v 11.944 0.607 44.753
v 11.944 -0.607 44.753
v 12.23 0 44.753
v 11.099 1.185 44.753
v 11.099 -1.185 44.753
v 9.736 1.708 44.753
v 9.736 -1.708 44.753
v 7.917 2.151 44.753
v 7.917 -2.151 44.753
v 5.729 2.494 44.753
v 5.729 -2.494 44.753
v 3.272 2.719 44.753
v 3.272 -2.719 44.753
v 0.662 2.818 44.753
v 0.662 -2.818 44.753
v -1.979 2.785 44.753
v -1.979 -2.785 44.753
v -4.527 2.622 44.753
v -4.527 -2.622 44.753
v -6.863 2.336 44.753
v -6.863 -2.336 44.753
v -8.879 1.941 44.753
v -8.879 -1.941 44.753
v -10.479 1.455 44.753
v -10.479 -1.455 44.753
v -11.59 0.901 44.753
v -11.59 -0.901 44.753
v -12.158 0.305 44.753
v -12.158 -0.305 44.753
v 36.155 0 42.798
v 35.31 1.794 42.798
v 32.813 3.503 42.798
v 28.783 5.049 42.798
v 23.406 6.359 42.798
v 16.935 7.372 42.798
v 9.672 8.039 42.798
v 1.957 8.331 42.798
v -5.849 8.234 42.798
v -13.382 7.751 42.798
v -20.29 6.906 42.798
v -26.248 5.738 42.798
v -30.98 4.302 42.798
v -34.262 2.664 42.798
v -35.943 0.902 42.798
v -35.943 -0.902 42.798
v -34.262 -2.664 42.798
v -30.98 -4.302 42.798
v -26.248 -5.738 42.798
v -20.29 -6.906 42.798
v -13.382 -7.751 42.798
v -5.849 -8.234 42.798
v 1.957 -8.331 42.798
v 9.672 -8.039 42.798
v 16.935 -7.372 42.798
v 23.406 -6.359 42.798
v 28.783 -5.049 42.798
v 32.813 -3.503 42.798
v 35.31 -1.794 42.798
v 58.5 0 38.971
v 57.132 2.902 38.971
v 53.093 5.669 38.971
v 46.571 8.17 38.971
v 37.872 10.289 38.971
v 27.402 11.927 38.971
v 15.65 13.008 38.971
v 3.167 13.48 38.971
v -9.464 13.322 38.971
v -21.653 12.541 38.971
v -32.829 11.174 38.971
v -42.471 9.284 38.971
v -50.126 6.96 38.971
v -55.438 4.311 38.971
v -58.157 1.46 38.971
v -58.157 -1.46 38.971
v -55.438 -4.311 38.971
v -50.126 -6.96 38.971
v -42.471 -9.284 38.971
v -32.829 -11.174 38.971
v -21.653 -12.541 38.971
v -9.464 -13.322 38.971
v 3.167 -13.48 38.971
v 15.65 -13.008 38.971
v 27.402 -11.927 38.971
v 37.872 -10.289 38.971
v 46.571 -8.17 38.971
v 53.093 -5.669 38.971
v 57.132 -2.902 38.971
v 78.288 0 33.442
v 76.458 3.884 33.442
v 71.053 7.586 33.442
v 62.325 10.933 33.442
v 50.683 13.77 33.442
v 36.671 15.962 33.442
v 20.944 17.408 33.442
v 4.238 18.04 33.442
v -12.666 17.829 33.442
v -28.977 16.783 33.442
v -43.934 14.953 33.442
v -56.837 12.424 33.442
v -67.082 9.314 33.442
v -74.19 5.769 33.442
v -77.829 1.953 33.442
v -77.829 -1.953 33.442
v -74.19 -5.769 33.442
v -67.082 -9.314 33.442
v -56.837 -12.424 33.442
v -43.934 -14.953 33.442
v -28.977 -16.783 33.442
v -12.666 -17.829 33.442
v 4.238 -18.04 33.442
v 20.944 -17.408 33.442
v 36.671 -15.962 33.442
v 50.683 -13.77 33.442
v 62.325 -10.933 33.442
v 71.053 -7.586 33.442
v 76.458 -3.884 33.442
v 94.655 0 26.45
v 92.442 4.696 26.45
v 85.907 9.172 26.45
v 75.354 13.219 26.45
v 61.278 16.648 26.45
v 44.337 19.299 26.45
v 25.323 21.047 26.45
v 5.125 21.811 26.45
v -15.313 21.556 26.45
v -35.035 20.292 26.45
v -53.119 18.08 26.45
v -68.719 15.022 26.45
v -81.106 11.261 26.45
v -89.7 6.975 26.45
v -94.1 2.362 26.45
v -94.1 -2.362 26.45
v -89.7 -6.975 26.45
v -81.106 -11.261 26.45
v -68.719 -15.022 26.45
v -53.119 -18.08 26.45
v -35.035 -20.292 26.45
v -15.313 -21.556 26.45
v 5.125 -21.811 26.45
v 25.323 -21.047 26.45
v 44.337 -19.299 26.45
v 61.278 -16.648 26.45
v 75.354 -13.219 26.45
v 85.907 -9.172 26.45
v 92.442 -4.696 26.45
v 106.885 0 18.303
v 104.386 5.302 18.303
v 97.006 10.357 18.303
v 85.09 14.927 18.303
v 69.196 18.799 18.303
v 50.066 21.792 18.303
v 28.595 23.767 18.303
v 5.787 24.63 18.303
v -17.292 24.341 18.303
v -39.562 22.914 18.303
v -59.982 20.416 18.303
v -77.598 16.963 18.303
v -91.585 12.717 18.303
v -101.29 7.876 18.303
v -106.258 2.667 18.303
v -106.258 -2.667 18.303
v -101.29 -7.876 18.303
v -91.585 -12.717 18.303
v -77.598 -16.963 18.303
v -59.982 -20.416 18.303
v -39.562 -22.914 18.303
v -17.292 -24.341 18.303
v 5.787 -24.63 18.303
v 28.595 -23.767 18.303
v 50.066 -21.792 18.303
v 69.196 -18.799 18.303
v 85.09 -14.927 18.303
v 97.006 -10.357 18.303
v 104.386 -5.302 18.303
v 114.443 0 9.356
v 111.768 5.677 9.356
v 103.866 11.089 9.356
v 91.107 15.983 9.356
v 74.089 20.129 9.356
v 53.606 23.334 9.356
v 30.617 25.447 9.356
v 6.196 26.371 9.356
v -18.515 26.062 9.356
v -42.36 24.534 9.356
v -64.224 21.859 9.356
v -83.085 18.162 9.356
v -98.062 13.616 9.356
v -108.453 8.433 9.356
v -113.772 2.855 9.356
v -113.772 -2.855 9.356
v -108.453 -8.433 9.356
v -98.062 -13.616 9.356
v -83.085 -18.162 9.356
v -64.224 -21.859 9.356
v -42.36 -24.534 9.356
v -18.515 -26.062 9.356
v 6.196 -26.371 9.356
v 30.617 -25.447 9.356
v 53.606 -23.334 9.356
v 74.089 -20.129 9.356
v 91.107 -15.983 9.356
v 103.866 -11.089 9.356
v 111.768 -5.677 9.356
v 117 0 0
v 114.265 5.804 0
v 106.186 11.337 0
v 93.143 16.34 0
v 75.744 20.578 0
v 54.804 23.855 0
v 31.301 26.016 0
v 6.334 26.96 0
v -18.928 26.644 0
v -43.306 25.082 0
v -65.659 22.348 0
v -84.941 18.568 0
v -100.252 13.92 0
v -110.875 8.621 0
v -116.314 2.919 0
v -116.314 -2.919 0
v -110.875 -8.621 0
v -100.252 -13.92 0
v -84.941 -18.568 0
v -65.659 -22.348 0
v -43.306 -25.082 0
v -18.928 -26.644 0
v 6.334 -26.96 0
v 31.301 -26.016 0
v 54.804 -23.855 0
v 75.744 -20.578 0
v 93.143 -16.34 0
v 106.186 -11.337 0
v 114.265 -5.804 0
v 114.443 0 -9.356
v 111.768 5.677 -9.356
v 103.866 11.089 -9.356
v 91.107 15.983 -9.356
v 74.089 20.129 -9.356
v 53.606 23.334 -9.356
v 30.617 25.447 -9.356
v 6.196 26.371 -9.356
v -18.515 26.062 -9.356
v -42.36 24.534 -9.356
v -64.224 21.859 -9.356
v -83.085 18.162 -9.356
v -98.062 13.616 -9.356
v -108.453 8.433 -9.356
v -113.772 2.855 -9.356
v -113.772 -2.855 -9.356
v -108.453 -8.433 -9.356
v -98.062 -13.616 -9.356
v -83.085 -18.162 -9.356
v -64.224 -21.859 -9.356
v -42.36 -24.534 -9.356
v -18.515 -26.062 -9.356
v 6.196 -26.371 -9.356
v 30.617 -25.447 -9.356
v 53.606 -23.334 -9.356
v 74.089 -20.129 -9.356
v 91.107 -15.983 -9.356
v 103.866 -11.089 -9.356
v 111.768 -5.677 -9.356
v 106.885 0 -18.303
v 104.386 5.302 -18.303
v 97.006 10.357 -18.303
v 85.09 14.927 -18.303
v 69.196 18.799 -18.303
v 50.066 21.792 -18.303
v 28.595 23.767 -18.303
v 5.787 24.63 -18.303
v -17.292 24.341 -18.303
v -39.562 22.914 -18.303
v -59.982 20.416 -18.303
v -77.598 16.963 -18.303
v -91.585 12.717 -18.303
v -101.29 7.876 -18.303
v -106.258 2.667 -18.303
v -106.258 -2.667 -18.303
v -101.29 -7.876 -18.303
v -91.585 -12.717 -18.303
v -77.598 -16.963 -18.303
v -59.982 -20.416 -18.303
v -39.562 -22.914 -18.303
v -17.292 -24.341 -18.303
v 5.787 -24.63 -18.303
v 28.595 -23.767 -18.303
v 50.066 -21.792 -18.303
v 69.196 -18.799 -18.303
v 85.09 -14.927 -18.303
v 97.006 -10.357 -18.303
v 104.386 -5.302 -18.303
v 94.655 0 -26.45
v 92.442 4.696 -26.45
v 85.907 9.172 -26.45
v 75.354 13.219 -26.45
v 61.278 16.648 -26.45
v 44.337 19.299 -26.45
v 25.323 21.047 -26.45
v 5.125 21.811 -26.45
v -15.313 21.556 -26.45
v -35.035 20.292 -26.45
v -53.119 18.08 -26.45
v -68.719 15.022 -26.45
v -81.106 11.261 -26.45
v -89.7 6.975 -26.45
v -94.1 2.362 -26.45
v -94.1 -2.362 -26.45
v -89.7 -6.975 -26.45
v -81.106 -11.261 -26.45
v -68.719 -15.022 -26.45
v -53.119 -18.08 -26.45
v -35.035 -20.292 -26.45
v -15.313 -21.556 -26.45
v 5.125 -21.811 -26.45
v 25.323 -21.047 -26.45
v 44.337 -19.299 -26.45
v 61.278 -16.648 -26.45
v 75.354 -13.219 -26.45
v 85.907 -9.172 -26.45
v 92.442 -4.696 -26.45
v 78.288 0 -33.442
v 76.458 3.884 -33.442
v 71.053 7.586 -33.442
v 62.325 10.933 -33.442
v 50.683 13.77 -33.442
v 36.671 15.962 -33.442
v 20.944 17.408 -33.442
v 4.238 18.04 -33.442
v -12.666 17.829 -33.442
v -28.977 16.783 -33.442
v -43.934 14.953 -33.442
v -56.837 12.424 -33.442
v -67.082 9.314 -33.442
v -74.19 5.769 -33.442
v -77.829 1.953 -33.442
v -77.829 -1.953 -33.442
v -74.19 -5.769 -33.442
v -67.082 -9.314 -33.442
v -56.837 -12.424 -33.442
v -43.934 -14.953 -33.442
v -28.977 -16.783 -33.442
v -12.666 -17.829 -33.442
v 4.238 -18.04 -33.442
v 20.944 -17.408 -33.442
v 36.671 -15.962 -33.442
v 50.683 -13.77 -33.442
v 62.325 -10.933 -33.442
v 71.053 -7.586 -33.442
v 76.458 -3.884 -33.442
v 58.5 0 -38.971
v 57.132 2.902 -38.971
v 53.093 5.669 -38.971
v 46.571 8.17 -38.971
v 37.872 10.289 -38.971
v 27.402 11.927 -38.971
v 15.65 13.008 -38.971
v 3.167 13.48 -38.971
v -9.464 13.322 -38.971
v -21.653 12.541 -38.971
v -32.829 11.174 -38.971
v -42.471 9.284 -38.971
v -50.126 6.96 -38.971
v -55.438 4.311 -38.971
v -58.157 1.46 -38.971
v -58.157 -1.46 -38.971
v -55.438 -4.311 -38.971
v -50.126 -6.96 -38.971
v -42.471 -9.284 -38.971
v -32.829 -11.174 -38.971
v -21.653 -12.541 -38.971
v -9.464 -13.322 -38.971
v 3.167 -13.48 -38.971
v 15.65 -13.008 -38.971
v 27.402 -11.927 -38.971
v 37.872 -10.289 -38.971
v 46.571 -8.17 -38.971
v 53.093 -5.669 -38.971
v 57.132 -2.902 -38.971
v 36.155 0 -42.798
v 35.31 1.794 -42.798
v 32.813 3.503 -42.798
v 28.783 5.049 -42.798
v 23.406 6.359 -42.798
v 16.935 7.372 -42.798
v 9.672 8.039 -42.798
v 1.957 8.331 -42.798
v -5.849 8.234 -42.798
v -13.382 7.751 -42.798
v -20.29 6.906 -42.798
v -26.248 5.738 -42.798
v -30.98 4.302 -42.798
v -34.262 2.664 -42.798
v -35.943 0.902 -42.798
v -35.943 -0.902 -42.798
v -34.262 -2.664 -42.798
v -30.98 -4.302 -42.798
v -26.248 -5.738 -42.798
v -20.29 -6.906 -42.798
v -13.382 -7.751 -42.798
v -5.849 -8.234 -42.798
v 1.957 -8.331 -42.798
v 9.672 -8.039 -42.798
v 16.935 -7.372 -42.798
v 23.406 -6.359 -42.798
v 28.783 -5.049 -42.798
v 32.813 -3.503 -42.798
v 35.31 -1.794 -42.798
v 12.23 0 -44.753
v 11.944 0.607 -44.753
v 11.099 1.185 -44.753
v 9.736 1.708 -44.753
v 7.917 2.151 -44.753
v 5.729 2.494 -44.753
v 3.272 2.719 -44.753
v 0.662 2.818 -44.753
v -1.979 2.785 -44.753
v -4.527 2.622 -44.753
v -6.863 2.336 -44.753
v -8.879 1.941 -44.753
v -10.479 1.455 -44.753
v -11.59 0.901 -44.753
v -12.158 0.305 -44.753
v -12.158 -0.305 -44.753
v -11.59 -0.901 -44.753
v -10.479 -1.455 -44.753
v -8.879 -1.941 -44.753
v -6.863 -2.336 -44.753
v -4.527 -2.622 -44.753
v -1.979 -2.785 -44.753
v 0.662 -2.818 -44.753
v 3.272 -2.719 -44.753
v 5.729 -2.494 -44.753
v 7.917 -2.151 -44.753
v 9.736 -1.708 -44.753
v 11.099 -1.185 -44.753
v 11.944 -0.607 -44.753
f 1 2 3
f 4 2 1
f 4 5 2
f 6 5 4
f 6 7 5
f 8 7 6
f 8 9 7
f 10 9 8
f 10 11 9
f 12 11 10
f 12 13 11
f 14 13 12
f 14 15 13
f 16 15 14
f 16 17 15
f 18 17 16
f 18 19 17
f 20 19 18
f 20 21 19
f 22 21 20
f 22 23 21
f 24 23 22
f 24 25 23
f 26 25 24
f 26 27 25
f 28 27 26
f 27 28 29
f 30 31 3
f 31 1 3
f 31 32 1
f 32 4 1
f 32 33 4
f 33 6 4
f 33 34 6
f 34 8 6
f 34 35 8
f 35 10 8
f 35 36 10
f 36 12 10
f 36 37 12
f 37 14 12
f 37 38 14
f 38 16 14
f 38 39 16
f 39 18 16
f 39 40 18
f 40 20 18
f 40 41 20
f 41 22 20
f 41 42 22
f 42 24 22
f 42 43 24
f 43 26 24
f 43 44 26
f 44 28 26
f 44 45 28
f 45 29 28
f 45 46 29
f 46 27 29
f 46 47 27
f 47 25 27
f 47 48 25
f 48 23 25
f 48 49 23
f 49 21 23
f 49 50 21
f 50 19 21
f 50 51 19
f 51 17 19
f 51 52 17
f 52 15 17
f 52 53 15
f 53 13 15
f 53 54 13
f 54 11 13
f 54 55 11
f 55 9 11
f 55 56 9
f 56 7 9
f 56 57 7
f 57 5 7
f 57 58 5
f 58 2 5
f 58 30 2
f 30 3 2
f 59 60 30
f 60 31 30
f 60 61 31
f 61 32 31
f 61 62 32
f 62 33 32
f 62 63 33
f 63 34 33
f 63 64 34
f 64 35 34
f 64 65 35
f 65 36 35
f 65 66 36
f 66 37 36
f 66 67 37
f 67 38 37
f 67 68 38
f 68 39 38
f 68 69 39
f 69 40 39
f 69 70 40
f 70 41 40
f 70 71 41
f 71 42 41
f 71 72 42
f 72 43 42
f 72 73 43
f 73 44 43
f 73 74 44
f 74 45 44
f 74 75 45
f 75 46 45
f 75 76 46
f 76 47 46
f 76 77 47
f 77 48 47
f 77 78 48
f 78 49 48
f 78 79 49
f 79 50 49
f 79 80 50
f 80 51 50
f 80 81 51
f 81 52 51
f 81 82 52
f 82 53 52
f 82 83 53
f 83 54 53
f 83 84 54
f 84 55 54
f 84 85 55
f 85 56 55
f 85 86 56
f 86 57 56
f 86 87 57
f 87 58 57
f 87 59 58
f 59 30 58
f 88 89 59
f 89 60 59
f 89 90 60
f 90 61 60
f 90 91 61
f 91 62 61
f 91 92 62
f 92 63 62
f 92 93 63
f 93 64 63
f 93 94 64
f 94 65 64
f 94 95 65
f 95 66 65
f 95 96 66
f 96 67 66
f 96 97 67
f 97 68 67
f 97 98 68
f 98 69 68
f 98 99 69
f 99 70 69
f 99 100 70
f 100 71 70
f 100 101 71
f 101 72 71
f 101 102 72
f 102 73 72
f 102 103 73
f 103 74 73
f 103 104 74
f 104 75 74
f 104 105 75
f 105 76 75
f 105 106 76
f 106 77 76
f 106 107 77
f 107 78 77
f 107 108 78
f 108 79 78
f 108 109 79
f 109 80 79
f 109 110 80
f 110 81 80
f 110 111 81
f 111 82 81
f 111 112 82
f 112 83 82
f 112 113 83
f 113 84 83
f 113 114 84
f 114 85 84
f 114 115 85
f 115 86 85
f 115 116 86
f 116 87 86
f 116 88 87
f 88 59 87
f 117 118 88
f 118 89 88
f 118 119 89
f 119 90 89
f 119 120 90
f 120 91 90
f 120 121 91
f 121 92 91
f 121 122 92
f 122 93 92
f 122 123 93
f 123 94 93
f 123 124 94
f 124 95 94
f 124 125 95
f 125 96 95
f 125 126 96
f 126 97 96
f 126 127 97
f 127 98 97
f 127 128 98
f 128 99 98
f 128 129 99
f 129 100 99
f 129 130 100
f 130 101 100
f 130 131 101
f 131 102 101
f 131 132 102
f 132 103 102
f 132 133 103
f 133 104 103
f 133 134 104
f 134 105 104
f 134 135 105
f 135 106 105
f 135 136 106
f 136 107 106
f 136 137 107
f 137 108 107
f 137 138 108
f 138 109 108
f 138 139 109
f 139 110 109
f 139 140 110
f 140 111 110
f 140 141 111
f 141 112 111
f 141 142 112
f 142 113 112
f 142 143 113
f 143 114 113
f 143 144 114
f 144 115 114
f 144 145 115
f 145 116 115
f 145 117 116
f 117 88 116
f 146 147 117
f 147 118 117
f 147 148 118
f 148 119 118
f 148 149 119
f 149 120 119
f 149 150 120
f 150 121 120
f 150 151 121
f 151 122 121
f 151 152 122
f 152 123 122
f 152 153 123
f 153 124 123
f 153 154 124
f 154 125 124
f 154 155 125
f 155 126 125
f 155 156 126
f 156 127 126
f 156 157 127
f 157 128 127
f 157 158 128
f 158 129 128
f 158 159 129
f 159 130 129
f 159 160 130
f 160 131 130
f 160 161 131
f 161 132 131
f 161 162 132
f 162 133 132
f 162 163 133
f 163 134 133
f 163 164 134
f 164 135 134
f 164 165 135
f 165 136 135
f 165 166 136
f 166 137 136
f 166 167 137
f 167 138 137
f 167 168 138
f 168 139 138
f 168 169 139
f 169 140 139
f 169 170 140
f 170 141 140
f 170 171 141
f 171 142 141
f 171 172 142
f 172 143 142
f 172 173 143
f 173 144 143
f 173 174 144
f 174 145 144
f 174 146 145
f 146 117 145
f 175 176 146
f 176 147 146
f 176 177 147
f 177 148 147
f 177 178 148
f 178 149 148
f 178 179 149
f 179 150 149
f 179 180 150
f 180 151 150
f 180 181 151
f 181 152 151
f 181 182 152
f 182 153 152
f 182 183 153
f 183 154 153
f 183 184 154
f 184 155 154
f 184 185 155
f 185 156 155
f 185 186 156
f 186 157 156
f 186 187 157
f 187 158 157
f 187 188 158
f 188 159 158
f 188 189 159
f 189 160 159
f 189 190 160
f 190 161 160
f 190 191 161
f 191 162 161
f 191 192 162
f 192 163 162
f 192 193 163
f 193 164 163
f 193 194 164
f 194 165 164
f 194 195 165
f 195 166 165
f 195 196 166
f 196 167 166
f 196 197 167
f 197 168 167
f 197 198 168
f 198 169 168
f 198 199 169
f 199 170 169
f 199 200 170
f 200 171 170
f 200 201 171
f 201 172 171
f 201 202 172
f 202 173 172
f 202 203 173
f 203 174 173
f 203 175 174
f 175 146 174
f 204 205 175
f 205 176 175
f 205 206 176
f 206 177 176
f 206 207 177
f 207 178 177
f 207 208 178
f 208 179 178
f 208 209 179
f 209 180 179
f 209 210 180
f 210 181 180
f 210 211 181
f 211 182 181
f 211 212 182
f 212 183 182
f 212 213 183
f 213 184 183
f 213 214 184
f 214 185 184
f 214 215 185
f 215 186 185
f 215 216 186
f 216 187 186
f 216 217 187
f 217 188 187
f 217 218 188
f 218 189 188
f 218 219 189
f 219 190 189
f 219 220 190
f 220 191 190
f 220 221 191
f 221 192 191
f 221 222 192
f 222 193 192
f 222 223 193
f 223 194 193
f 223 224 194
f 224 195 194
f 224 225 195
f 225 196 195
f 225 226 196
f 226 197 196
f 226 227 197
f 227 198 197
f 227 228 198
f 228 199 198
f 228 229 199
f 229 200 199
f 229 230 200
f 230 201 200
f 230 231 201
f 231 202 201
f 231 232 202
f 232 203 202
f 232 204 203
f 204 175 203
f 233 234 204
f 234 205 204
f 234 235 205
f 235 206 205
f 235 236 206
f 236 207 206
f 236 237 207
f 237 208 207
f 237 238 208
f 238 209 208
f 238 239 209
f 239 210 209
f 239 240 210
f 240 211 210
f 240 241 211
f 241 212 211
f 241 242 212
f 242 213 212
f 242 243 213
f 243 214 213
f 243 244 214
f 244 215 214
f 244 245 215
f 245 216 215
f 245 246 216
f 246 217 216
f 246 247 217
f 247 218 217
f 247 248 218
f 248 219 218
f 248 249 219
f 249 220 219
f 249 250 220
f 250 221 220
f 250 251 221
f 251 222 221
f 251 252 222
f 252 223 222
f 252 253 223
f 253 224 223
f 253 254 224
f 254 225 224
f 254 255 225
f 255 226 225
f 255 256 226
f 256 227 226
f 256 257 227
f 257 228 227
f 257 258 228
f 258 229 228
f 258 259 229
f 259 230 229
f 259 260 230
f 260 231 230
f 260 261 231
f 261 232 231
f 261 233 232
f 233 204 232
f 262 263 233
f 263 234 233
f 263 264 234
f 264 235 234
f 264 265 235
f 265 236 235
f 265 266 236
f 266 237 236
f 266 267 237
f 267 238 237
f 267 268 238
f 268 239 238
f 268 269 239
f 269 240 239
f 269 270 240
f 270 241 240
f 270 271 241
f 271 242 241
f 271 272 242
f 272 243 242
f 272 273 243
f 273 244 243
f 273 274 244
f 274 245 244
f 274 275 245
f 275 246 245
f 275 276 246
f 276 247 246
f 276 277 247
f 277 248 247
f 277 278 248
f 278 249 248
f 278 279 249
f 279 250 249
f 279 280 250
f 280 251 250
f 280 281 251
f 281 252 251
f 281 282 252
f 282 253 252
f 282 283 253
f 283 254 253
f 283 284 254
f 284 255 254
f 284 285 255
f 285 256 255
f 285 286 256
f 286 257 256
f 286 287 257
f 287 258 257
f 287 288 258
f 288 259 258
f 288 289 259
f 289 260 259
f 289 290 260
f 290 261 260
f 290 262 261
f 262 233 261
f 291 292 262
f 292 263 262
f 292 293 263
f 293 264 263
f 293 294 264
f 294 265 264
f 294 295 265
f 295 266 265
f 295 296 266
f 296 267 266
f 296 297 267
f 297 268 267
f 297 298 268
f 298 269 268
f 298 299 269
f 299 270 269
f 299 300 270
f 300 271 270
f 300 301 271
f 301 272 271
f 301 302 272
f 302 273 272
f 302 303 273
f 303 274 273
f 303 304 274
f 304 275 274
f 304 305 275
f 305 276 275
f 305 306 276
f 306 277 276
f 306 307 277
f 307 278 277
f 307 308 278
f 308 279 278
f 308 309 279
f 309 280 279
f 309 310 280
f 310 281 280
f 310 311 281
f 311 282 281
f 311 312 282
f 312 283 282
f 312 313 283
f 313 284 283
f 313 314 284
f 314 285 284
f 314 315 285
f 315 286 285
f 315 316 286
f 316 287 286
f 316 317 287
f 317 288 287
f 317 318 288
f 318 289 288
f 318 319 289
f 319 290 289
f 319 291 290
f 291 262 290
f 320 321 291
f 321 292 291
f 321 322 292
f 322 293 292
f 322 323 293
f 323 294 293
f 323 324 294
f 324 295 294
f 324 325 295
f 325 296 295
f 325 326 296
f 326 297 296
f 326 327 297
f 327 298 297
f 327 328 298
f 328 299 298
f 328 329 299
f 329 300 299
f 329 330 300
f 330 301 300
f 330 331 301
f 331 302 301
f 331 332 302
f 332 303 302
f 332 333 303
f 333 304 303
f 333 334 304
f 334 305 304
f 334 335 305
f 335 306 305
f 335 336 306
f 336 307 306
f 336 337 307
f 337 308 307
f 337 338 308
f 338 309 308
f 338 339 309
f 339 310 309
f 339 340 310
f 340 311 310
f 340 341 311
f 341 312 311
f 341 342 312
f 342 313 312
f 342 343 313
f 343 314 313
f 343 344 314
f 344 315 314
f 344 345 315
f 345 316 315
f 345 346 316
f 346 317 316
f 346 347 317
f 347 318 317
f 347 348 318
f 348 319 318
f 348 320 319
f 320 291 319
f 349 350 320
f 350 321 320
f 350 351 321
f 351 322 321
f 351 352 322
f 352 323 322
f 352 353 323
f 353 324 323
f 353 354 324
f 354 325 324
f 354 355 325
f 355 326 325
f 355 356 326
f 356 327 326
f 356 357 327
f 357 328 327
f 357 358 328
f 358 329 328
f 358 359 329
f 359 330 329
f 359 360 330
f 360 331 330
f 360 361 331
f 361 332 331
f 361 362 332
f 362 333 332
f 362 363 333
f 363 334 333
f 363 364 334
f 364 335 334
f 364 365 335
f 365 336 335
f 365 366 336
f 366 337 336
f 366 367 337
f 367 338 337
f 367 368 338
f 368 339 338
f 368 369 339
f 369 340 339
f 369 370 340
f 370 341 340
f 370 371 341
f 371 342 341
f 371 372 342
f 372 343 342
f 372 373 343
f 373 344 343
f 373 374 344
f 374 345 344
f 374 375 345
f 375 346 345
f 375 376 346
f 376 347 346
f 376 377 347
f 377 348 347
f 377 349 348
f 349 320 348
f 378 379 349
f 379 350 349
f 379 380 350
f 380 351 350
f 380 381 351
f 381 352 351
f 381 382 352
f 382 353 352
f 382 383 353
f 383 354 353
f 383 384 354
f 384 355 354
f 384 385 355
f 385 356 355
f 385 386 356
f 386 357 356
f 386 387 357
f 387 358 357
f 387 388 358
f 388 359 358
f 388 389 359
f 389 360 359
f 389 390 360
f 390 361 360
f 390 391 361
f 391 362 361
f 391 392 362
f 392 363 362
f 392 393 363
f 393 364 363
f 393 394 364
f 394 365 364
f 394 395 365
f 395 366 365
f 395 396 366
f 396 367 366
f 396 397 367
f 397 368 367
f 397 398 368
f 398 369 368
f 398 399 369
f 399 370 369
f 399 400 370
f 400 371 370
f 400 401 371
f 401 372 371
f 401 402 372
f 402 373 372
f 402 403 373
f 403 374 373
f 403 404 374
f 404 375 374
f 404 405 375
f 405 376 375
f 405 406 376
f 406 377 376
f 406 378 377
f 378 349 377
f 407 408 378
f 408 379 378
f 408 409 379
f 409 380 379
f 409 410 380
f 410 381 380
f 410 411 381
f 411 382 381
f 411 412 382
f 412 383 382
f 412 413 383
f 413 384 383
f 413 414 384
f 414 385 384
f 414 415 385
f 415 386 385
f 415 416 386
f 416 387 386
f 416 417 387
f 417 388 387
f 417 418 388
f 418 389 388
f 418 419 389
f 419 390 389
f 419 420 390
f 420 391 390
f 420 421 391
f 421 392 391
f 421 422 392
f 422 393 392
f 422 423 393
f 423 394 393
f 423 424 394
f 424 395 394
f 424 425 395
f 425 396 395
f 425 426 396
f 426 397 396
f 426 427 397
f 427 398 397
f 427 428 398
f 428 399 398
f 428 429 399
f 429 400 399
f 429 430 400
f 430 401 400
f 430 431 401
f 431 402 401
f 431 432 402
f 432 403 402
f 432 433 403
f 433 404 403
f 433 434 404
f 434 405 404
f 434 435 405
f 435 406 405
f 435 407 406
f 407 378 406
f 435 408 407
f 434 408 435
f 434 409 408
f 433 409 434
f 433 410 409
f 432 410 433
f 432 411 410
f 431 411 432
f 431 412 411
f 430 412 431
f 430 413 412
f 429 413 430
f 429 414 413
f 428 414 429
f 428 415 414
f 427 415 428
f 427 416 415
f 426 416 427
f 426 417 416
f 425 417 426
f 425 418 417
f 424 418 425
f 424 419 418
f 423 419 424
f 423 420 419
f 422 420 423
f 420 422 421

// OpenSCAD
// Generated by SolidPython 1.0.1 on 2020-07-29 00:46:50


scale(v = [13, 3, 5]) {
	sphere(r = 9);
}
/***********************************************
*********      SolidPython code:      **********
************************************************
 
# import packages: SolidPython
from solid import *
from solid.utils import *
from itertools import chain, combinations, permutations


class Resize:

    def __init__(self, scad_file):
        self.scad_file = scad_file
        #self.scad_file = import_scad(scad_file)
        # cone/cylinder param:
        self.r1 = 0
        self.r2 = 0
        self.h = 0
        # rectangular prism param:
        self.w = 0
        self.l = 0
        # ellipse param:
        self.r = 0

    # import OpenScad code (file name corresponds to shape)


    # classify shape + parameters
    def assign(self, param1, param2, param3):
        if self.scad_file == 'cone.scad':
            self.r1 = param1
            self.r2 = param2
            self.h = param3
        elif self.scad_file == 'cylinder.scad':
            self.r1 = param1
            self.r2 = param2
            self.h = param3
        elif self.scad_file == 'rectangularPrism.scad':
            self.h = param1
            self.l = param2
            self.w = param3
        else:
            self.r = param1
            self.h = param2

    # resize parameters
    def iterate(self):
        x = range(3, 20, 2)
        i = 1
        if self.scad_file == 'cone.scad':
            tempList = list(permutations(x, 2))
            for temp in tempList:
                param1 = temp[0]
                param2 = temp[1]
                filepath = 'produced_scad_files/' + 'cone' + str(param1) + '_' + str(param2) + '_' + '.scad'
                scad_render_to_file(cylinder(h=param1, r1=param2, r2=0), filepath)

        elif self.scad_file == 'cylinder.scad':
            tempList = list(permutations(x, 3))
            for temp in tempList:
                param1 = temp[0]
                param2 = temp[1]
                filepath = 'produced_scad_files/' + 'cylinder' + str(param1) + '_' + str(param2) + '_' + '.scad'
                scad_render_to_file(cylinder(h=param1, r1=param2, r2=param2), filepath)

        elif self.scad_file == 'rectangularPrism.scad':
            tempList = list(permutations(x, 3))
            for temp in tempList:
                param1 = temp[0]
                param2 = temp[1]
                param3 = temp[2]
                filepath = 'produced_scad_files/' + 'rectangularPrism' + str(param1) + '_' + str(param2) + '_' + str(
                    param3) + '.scad'
                scad_render_to_file(cube(size=(param1, param2, param3)), filepath)

        elif self.scad_file == 'ellipse.scad':
            tempList = list(permutations(x, 4))
            for temp in tempList:
                param1 = temp[0]
                param2 = temp[1]
                param3 = temp[2]
                param4 = temp[3]
                filepath = 'produced_scad_files/' + 'ellipse' + str(param1) + '_' + str(param2) + '_' + str(param3) + '_' + str(param4) + '.scad'
                scad_render_to_file(scale([param1, param2, param3])(sphere(r=param4)), filepath)

    def render_to_scadfile(self):
        scad_render_to_file(scad, 'example.scad') 
 
************************************************/
